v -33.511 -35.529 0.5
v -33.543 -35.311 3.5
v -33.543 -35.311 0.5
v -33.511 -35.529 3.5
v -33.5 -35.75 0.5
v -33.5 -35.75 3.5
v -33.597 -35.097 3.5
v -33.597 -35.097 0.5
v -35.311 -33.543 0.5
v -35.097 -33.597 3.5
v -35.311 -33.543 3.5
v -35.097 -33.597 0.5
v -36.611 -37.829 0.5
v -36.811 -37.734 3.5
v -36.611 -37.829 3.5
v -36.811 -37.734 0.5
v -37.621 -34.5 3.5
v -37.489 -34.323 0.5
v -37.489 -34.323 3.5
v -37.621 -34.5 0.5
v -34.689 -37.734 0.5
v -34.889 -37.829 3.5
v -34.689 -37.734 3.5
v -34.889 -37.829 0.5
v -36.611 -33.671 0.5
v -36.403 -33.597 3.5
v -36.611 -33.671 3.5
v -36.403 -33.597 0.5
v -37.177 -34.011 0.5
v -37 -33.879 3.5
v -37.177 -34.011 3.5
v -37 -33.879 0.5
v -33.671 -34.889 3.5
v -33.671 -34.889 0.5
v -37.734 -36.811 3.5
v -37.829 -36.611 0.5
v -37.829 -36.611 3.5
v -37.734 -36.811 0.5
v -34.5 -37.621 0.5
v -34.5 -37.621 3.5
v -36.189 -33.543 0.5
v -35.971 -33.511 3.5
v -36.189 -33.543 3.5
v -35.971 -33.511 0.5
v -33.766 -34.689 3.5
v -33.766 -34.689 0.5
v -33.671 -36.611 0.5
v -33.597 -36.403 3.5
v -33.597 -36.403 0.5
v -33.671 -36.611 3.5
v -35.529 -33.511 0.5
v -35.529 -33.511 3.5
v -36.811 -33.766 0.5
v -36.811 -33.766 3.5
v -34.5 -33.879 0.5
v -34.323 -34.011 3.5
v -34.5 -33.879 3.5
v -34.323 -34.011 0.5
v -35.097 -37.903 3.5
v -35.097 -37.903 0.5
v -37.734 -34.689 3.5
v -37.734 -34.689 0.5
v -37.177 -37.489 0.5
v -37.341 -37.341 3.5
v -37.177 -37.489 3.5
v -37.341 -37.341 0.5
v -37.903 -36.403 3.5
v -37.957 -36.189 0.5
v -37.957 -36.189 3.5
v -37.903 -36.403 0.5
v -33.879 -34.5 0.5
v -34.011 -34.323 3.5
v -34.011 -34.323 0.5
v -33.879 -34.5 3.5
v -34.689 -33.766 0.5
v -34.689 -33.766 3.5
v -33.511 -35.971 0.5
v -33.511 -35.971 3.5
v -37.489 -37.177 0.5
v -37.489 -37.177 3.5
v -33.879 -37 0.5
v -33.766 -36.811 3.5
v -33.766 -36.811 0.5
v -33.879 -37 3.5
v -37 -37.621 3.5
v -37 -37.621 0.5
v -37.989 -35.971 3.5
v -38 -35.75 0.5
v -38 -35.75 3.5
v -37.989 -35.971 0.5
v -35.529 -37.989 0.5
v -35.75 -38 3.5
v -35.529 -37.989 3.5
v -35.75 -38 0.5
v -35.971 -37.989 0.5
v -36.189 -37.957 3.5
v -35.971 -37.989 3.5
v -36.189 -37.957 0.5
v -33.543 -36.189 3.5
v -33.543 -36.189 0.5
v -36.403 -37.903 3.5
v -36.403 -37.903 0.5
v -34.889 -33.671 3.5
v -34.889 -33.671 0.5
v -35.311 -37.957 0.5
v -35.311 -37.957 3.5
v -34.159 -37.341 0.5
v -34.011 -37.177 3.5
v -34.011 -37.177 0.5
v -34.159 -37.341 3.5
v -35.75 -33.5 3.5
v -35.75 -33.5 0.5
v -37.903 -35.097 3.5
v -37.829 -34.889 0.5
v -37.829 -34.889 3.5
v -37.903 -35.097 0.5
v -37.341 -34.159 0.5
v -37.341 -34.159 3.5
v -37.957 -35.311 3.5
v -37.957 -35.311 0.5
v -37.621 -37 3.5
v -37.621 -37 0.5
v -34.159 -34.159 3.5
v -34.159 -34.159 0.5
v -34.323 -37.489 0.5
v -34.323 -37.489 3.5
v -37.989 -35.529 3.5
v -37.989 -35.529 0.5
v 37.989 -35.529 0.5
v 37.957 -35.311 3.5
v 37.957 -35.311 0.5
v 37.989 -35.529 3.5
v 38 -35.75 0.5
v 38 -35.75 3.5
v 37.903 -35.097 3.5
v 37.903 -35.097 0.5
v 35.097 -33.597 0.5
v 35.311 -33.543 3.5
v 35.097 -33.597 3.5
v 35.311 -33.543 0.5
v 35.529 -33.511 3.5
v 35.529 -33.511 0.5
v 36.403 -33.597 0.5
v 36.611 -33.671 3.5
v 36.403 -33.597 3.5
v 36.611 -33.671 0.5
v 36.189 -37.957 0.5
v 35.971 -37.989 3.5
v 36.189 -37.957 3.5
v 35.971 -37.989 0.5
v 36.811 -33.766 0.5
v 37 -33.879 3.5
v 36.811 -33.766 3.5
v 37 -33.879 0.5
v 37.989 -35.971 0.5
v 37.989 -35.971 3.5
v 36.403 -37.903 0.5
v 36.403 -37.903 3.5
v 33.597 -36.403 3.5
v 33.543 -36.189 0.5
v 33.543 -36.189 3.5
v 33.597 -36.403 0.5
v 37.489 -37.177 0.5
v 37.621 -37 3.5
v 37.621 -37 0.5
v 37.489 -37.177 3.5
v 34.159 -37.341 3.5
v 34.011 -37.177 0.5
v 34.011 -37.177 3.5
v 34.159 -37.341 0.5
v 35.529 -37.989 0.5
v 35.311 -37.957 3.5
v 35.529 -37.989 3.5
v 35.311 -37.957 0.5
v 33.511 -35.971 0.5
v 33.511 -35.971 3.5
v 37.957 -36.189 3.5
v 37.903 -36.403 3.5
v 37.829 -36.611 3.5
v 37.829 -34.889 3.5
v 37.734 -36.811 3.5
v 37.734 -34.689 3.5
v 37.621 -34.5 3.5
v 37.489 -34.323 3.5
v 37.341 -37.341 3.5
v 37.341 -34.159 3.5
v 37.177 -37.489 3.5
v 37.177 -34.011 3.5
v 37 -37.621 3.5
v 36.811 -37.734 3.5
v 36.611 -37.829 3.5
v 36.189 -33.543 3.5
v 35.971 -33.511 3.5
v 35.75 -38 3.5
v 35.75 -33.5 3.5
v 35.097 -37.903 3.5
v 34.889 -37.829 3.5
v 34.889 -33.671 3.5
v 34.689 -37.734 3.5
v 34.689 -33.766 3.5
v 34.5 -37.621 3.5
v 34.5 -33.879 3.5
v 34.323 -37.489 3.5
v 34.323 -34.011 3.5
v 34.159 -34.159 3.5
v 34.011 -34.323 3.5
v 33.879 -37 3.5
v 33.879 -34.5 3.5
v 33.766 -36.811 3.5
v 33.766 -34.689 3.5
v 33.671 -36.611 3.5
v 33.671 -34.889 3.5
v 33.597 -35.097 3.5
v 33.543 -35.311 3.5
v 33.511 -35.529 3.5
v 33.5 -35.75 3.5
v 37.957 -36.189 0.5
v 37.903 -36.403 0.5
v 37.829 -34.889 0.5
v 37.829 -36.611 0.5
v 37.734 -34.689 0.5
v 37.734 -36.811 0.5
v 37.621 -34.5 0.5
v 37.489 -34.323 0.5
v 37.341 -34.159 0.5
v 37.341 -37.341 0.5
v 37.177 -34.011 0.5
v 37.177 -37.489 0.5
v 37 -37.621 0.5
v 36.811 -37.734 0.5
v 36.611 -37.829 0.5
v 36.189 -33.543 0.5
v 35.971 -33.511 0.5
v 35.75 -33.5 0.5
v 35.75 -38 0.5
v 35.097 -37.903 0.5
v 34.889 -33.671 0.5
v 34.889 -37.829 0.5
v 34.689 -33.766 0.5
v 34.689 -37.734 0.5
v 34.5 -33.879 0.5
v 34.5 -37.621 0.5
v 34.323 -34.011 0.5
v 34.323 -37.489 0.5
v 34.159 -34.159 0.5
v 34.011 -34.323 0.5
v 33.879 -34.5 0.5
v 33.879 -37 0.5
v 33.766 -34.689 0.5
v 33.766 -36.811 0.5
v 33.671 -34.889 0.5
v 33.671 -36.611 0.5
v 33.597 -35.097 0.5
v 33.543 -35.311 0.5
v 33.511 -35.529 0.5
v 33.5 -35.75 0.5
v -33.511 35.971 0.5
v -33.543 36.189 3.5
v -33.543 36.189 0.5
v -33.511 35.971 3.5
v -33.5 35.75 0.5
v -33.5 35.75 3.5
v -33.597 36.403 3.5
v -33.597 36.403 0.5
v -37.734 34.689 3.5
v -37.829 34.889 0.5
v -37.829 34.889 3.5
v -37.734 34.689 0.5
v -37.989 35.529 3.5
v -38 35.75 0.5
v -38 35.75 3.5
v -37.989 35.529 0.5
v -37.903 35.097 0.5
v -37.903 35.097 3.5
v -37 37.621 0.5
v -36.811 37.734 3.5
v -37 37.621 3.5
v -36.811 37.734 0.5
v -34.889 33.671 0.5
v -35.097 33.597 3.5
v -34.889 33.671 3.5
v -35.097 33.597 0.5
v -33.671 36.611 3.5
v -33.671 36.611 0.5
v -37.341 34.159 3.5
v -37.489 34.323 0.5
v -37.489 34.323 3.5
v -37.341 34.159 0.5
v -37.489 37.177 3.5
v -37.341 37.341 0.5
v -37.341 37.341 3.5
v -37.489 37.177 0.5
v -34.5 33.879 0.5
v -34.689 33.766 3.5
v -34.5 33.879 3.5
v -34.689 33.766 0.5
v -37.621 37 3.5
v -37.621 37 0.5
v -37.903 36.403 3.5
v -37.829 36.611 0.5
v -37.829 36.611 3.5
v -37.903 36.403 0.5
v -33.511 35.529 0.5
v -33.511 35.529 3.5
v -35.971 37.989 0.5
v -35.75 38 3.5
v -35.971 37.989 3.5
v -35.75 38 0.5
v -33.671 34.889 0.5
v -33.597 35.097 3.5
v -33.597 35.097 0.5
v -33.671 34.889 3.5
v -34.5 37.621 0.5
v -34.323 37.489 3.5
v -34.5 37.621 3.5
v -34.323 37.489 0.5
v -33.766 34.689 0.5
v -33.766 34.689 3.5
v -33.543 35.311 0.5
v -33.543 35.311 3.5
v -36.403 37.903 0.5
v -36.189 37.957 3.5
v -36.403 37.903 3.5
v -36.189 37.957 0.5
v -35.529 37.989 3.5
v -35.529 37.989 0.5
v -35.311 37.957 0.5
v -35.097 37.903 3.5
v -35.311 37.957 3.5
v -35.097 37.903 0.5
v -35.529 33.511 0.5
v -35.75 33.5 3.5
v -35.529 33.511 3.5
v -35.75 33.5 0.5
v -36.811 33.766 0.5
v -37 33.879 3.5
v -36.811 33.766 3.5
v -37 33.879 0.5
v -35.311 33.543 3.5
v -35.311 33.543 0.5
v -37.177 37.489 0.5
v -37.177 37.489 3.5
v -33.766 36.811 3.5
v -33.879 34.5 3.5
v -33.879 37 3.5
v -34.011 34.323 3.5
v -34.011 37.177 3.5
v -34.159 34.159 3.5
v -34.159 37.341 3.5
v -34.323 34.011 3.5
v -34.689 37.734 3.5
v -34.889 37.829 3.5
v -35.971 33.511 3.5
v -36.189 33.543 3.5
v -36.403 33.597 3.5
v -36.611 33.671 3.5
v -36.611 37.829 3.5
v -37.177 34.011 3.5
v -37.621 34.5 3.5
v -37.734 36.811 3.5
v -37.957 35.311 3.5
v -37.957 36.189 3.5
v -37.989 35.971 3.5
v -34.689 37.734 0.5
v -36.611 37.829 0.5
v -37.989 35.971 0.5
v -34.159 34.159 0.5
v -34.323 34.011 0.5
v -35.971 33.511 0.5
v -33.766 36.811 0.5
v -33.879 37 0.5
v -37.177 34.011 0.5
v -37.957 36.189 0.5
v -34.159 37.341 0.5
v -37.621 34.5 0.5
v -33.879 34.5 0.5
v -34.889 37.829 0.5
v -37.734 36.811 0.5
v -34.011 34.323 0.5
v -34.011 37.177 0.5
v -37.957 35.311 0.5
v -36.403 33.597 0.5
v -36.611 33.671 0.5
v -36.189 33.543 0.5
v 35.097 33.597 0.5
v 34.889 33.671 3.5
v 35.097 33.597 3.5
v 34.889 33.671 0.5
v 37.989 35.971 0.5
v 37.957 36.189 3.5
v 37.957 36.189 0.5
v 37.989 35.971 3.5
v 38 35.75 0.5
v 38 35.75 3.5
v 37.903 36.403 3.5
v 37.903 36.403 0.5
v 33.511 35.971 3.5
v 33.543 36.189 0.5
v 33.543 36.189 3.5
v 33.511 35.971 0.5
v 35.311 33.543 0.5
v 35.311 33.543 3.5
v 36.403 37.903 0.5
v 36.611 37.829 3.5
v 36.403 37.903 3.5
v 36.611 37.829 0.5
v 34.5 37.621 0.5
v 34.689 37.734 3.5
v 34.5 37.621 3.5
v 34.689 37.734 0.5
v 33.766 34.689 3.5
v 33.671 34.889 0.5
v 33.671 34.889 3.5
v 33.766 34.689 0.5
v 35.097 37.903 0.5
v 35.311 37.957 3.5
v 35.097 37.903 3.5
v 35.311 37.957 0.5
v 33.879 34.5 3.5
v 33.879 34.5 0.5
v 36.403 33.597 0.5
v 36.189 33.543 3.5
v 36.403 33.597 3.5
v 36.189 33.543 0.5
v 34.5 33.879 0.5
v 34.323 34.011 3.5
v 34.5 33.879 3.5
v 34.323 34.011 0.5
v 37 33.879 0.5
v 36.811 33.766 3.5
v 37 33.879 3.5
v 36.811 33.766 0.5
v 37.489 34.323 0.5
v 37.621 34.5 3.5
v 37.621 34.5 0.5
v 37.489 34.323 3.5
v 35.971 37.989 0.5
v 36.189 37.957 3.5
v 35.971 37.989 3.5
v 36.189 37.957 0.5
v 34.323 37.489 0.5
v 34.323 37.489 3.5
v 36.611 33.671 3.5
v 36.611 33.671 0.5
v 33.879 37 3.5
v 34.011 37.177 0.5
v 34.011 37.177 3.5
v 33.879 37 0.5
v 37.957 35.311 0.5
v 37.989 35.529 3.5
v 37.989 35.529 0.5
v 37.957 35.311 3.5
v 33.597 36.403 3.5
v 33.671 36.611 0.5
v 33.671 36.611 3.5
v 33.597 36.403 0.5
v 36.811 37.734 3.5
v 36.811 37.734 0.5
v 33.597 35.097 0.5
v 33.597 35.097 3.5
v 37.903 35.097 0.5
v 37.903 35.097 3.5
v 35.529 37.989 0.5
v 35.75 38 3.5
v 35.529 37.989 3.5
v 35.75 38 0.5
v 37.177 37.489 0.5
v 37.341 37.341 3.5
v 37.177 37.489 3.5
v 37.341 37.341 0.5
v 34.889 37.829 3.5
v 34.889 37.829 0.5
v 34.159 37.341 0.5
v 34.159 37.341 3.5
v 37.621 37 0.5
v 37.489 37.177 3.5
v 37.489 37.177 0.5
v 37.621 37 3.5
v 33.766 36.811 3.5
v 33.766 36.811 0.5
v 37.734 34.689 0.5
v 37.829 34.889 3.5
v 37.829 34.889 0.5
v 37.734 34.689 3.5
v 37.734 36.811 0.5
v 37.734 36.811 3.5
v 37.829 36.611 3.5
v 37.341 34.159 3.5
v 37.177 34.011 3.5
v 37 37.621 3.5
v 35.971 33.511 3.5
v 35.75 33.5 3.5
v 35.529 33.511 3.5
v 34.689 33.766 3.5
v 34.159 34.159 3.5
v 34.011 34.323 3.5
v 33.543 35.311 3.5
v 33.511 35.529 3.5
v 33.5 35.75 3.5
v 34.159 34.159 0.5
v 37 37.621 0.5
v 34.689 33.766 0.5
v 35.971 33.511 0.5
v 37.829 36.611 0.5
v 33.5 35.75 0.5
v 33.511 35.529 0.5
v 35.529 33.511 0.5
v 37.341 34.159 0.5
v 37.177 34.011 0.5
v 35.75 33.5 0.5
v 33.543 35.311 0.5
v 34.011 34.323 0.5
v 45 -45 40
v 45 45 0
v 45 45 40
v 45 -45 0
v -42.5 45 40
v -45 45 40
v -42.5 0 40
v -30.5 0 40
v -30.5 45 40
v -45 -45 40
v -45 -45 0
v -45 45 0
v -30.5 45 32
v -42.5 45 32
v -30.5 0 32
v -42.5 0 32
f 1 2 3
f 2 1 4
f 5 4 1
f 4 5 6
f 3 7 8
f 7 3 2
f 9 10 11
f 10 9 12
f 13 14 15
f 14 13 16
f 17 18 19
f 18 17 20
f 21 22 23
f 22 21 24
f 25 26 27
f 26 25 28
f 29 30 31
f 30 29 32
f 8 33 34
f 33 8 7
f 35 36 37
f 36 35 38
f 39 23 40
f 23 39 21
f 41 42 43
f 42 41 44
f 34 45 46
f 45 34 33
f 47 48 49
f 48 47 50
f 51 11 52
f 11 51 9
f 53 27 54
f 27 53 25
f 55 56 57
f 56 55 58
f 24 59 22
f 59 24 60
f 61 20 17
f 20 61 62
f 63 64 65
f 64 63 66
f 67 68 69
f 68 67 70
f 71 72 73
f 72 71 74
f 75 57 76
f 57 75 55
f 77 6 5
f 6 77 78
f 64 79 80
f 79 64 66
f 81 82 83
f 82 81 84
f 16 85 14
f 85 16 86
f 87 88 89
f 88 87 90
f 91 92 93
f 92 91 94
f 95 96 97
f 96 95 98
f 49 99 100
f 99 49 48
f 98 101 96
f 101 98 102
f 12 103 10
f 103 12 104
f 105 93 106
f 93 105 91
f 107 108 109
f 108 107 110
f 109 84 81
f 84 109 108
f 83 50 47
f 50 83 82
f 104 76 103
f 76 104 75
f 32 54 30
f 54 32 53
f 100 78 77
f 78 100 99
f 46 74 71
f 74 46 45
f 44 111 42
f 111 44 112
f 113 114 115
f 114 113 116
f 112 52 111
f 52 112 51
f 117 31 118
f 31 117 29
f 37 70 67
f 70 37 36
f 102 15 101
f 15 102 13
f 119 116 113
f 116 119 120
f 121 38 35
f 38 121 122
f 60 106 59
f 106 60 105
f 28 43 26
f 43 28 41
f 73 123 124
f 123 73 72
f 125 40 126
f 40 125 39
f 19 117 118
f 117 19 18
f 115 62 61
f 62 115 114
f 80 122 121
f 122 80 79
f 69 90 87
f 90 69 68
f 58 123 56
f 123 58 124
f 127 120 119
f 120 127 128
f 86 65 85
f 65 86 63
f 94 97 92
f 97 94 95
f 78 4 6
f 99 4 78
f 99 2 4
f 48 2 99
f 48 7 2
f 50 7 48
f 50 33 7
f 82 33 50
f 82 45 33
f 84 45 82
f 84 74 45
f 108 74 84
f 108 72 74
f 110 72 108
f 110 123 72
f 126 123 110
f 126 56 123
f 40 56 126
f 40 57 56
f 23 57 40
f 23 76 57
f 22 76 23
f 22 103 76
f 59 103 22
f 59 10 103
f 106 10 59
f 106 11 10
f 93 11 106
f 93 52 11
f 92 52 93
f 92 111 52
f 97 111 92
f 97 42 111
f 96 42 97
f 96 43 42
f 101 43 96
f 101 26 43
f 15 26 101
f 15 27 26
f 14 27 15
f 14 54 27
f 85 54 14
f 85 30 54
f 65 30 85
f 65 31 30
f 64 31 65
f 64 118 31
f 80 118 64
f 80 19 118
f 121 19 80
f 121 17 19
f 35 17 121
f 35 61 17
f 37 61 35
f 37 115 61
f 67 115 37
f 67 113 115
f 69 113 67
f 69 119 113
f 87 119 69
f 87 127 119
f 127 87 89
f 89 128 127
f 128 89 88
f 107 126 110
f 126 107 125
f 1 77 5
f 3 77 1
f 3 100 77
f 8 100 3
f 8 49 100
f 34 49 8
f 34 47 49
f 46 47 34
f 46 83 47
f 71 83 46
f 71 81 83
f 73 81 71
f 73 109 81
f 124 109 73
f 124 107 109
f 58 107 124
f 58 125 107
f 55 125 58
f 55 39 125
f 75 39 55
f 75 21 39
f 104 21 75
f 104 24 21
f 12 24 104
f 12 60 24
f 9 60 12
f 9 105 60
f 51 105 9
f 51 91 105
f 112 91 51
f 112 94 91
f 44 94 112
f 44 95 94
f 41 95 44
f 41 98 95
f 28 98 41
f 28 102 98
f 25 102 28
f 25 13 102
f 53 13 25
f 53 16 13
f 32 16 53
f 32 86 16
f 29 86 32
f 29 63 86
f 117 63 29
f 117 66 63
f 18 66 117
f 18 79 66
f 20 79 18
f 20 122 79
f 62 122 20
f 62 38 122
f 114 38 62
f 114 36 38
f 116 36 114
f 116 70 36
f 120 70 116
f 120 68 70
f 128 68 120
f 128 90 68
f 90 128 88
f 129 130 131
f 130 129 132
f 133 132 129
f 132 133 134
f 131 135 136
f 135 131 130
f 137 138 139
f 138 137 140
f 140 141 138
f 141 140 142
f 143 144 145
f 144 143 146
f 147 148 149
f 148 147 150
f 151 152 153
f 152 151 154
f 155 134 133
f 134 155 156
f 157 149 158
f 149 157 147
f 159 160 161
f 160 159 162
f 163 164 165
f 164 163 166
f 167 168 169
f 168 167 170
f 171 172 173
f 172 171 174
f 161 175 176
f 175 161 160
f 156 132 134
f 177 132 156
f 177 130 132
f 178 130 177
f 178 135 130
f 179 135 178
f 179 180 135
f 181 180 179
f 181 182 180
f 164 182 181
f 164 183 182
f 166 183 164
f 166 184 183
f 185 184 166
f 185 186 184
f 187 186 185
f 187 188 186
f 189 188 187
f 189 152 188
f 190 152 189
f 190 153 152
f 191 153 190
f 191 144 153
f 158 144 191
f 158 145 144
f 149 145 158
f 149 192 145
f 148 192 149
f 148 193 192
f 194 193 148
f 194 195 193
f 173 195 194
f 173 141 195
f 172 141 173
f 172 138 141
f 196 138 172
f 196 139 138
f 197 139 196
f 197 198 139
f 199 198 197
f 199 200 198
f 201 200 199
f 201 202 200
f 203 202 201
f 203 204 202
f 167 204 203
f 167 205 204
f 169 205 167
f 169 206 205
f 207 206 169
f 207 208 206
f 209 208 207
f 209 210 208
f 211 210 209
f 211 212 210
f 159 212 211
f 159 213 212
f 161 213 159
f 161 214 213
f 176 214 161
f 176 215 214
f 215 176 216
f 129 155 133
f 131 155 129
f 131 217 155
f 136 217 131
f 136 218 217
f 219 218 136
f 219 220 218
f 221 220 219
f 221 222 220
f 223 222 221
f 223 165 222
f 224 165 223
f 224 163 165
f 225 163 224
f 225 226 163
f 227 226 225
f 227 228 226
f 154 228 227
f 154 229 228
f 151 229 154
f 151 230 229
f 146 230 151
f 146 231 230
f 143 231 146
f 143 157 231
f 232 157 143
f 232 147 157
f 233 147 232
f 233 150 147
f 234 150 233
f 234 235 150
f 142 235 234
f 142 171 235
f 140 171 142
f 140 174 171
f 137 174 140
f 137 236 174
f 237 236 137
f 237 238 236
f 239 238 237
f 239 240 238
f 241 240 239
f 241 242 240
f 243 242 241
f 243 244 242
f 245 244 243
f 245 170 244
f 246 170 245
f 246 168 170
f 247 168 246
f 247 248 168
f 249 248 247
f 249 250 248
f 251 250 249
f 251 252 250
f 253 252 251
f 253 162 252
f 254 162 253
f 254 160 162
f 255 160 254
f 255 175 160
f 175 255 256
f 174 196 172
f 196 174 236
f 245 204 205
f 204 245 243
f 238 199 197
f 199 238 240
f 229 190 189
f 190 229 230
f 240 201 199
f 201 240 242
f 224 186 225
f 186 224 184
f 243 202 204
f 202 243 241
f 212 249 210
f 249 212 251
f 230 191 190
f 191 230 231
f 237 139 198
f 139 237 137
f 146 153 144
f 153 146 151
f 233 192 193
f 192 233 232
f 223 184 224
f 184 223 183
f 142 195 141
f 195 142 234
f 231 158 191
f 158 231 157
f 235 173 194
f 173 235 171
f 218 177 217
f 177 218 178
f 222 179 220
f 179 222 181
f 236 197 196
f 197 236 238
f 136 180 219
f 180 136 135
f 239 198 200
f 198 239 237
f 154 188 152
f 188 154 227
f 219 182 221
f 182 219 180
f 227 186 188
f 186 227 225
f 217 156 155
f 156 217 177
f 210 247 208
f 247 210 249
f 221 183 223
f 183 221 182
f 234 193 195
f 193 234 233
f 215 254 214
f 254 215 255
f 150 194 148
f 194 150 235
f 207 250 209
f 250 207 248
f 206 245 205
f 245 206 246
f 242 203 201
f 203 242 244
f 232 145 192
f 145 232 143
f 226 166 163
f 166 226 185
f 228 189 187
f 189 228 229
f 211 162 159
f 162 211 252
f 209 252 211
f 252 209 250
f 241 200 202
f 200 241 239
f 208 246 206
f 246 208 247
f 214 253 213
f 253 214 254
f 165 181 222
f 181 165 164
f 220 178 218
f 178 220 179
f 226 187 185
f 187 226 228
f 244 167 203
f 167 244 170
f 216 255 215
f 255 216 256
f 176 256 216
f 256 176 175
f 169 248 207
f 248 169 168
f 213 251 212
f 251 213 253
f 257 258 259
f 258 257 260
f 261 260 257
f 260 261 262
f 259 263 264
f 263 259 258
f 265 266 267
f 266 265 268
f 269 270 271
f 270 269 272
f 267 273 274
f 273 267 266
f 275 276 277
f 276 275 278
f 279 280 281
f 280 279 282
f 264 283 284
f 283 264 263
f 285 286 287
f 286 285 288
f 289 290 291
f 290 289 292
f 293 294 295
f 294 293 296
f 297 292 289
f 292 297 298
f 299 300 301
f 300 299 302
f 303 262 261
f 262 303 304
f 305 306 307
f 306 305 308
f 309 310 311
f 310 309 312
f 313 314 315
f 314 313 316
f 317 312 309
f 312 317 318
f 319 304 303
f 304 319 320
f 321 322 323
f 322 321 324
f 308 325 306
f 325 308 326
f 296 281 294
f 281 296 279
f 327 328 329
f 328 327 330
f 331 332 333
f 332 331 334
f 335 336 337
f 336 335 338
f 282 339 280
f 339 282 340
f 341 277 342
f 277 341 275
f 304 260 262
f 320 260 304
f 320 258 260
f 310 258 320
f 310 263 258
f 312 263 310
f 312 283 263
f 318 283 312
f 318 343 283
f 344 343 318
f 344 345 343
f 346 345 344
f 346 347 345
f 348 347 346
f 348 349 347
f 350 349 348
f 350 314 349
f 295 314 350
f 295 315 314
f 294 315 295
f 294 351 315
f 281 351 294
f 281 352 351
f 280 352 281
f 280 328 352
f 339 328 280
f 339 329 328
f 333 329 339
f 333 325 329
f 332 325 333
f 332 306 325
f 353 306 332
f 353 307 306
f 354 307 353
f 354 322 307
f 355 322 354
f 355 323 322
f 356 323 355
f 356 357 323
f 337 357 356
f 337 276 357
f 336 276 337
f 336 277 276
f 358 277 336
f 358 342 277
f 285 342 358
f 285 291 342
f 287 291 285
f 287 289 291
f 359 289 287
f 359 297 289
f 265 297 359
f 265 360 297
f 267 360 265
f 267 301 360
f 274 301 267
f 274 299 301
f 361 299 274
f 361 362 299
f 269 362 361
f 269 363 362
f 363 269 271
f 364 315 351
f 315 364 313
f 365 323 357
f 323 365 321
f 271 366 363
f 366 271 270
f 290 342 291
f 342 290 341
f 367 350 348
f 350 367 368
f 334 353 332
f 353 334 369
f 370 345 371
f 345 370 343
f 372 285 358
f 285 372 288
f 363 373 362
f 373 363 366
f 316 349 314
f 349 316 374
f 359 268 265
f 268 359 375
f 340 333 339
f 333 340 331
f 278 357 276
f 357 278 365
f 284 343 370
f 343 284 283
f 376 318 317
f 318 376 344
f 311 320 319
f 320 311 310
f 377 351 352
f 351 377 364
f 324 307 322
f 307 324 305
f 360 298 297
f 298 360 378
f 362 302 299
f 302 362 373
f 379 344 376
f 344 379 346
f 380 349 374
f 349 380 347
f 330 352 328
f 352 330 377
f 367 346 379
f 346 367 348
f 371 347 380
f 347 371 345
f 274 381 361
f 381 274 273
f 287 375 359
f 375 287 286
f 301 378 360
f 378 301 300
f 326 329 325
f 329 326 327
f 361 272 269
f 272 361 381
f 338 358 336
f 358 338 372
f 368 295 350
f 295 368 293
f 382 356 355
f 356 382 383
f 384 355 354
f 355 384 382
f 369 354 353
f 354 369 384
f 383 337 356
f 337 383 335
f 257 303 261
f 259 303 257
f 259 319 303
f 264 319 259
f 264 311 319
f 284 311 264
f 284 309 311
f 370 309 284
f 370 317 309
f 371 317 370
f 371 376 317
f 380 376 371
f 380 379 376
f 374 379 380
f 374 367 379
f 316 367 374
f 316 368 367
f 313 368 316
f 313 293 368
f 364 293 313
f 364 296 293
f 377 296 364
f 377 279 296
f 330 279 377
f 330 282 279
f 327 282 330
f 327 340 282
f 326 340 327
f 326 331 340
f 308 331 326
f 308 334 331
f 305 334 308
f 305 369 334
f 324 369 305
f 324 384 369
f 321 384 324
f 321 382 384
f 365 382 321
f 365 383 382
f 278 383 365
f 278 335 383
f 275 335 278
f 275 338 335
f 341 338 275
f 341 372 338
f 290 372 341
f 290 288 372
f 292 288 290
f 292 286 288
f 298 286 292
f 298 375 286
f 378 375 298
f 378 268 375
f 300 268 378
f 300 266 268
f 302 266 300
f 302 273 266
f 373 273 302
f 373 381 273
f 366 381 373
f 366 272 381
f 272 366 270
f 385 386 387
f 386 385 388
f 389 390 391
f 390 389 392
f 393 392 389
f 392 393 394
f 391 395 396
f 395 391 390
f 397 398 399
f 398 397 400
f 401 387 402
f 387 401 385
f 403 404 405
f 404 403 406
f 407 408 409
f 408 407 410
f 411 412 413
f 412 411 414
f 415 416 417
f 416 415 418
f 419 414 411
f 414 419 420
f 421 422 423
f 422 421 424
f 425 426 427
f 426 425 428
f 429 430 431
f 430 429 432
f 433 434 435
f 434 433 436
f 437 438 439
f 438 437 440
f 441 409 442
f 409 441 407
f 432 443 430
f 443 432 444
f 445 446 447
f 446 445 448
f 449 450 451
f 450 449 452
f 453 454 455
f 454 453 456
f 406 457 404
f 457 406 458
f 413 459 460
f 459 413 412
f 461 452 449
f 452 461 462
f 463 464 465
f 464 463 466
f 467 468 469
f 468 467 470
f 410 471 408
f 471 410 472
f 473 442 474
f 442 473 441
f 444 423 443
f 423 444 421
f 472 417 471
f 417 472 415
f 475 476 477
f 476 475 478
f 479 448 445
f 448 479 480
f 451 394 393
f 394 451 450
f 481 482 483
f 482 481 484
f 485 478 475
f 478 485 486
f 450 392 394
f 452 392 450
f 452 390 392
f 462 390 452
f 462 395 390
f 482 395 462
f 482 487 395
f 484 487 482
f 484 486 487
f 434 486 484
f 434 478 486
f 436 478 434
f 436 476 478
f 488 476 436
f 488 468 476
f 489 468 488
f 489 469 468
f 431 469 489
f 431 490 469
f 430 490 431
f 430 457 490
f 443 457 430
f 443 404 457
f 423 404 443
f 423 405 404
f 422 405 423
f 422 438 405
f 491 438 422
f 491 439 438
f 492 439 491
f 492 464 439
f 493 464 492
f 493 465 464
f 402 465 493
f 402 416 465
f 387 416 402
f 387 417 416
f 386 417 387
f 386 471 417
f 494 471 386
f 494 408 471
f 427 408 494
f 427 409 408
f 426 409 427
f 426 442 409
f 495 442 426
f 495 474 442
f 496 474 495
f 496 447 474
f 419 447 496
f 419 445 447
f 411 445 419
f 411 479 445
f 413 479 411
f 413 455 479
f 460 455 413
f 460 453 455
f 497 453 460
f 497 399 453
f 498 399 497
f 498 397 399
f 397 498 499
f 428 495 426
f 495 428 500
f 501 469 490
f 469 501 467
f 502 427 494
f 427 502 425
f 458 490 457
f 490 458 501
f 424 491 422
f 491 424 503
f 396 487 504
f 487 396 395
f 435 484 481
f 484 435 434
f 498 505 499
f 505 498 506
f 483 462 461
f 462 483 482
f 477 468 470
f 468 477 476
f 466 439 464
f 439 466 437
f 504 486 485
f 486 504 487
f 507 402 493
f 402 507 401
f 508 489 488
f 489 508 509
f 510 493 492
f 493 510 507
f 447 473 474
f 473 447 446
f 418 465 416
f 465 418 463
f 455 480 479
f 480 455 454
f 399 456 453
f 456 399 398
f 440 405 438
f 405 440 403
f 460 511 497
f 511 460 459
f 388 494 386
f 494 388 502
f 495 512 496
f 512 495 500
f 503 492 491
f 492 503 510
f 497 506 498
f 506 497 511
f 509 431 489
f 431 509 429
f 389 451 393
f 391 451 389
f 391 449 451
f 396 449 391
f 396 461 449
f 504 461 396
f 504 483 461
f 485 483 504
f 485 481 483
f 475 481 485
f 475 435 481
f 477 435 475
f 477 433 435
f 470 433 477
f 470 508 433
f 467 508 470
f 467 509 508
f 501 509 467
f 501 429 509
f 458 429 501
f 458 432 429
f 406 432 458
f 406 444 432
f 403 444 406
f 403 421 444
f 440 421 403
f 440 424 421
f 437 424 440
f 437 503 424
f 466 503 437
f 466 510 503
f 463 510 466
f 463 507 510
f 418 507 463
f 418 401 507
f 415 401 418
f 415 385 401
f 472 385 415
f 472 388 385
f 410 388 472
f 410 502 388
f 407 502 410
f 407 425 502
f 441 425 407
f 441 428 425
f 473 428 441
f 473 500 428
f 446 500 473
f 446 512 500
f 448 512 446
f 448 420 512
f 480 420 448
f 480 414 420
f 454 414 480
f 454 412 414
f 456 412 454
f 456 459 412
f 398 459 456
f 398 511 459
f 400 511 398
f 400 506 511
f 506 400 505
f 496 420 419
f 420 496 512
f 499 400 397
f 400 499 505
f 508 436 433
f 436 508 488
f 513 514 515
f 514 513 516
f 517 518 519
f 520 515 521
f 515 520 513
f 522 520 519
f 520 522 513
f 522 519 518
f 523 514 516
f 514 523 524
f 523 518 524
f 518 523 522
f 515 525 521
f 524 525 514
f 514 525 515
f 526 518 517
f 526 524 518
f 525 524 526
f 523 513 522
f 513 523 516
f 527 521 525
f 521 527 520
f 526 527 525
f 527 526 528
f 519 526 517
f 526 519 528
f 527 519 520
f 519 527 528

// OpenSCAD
// Magnetic stirrer housing for 80 mm PC case fan
// Print orientation: top plate on bed (z = 0), walls rise to z = 40, open top

$fn = 64;

// --- Dimensions (mm) ---
plate_t      = 2;     // top plate thickness
wall_t       = 2.5;   // wall thickness
box_h        = 40;    // total height of box (open top)
outer_w      = 90;    // outer size in X and Y
hole_d       = 4.5;   // M4 screw hole diameter
hole_pitch   = 71.5;  // square pitch of screw holes
notch_w      = 12;    // cable notch width
notch_depth  = 8;     // cable notch depth from open edge
eps          = 0.5;   // cutter overshoot past faces

// Derived
inner_w = outer_w - 2 * wall_t;   // 85 mm inner size

difference() {
    // Solid block: top plate + walls
    translate([-outer_w / 2, -outer_w / 2, 0])
        cube([outer_w, outer_w, box_h]);

    // Screw holes through top plate
    for (i = [-1, 1])
        for (j = [-1, 1])
            translate([j * hole_pitch / 2, i * hole_pitch / 2, eps])
                cylinder(d = hole_d, h = plate_t + 2 * eps);

    // Cable notch in one wall (along X, centred)
    translate([-inner_w / 2, 0, box_h - notch_depth])
        cube([notch_w, inner_w, notch_depth + eps]);
}
